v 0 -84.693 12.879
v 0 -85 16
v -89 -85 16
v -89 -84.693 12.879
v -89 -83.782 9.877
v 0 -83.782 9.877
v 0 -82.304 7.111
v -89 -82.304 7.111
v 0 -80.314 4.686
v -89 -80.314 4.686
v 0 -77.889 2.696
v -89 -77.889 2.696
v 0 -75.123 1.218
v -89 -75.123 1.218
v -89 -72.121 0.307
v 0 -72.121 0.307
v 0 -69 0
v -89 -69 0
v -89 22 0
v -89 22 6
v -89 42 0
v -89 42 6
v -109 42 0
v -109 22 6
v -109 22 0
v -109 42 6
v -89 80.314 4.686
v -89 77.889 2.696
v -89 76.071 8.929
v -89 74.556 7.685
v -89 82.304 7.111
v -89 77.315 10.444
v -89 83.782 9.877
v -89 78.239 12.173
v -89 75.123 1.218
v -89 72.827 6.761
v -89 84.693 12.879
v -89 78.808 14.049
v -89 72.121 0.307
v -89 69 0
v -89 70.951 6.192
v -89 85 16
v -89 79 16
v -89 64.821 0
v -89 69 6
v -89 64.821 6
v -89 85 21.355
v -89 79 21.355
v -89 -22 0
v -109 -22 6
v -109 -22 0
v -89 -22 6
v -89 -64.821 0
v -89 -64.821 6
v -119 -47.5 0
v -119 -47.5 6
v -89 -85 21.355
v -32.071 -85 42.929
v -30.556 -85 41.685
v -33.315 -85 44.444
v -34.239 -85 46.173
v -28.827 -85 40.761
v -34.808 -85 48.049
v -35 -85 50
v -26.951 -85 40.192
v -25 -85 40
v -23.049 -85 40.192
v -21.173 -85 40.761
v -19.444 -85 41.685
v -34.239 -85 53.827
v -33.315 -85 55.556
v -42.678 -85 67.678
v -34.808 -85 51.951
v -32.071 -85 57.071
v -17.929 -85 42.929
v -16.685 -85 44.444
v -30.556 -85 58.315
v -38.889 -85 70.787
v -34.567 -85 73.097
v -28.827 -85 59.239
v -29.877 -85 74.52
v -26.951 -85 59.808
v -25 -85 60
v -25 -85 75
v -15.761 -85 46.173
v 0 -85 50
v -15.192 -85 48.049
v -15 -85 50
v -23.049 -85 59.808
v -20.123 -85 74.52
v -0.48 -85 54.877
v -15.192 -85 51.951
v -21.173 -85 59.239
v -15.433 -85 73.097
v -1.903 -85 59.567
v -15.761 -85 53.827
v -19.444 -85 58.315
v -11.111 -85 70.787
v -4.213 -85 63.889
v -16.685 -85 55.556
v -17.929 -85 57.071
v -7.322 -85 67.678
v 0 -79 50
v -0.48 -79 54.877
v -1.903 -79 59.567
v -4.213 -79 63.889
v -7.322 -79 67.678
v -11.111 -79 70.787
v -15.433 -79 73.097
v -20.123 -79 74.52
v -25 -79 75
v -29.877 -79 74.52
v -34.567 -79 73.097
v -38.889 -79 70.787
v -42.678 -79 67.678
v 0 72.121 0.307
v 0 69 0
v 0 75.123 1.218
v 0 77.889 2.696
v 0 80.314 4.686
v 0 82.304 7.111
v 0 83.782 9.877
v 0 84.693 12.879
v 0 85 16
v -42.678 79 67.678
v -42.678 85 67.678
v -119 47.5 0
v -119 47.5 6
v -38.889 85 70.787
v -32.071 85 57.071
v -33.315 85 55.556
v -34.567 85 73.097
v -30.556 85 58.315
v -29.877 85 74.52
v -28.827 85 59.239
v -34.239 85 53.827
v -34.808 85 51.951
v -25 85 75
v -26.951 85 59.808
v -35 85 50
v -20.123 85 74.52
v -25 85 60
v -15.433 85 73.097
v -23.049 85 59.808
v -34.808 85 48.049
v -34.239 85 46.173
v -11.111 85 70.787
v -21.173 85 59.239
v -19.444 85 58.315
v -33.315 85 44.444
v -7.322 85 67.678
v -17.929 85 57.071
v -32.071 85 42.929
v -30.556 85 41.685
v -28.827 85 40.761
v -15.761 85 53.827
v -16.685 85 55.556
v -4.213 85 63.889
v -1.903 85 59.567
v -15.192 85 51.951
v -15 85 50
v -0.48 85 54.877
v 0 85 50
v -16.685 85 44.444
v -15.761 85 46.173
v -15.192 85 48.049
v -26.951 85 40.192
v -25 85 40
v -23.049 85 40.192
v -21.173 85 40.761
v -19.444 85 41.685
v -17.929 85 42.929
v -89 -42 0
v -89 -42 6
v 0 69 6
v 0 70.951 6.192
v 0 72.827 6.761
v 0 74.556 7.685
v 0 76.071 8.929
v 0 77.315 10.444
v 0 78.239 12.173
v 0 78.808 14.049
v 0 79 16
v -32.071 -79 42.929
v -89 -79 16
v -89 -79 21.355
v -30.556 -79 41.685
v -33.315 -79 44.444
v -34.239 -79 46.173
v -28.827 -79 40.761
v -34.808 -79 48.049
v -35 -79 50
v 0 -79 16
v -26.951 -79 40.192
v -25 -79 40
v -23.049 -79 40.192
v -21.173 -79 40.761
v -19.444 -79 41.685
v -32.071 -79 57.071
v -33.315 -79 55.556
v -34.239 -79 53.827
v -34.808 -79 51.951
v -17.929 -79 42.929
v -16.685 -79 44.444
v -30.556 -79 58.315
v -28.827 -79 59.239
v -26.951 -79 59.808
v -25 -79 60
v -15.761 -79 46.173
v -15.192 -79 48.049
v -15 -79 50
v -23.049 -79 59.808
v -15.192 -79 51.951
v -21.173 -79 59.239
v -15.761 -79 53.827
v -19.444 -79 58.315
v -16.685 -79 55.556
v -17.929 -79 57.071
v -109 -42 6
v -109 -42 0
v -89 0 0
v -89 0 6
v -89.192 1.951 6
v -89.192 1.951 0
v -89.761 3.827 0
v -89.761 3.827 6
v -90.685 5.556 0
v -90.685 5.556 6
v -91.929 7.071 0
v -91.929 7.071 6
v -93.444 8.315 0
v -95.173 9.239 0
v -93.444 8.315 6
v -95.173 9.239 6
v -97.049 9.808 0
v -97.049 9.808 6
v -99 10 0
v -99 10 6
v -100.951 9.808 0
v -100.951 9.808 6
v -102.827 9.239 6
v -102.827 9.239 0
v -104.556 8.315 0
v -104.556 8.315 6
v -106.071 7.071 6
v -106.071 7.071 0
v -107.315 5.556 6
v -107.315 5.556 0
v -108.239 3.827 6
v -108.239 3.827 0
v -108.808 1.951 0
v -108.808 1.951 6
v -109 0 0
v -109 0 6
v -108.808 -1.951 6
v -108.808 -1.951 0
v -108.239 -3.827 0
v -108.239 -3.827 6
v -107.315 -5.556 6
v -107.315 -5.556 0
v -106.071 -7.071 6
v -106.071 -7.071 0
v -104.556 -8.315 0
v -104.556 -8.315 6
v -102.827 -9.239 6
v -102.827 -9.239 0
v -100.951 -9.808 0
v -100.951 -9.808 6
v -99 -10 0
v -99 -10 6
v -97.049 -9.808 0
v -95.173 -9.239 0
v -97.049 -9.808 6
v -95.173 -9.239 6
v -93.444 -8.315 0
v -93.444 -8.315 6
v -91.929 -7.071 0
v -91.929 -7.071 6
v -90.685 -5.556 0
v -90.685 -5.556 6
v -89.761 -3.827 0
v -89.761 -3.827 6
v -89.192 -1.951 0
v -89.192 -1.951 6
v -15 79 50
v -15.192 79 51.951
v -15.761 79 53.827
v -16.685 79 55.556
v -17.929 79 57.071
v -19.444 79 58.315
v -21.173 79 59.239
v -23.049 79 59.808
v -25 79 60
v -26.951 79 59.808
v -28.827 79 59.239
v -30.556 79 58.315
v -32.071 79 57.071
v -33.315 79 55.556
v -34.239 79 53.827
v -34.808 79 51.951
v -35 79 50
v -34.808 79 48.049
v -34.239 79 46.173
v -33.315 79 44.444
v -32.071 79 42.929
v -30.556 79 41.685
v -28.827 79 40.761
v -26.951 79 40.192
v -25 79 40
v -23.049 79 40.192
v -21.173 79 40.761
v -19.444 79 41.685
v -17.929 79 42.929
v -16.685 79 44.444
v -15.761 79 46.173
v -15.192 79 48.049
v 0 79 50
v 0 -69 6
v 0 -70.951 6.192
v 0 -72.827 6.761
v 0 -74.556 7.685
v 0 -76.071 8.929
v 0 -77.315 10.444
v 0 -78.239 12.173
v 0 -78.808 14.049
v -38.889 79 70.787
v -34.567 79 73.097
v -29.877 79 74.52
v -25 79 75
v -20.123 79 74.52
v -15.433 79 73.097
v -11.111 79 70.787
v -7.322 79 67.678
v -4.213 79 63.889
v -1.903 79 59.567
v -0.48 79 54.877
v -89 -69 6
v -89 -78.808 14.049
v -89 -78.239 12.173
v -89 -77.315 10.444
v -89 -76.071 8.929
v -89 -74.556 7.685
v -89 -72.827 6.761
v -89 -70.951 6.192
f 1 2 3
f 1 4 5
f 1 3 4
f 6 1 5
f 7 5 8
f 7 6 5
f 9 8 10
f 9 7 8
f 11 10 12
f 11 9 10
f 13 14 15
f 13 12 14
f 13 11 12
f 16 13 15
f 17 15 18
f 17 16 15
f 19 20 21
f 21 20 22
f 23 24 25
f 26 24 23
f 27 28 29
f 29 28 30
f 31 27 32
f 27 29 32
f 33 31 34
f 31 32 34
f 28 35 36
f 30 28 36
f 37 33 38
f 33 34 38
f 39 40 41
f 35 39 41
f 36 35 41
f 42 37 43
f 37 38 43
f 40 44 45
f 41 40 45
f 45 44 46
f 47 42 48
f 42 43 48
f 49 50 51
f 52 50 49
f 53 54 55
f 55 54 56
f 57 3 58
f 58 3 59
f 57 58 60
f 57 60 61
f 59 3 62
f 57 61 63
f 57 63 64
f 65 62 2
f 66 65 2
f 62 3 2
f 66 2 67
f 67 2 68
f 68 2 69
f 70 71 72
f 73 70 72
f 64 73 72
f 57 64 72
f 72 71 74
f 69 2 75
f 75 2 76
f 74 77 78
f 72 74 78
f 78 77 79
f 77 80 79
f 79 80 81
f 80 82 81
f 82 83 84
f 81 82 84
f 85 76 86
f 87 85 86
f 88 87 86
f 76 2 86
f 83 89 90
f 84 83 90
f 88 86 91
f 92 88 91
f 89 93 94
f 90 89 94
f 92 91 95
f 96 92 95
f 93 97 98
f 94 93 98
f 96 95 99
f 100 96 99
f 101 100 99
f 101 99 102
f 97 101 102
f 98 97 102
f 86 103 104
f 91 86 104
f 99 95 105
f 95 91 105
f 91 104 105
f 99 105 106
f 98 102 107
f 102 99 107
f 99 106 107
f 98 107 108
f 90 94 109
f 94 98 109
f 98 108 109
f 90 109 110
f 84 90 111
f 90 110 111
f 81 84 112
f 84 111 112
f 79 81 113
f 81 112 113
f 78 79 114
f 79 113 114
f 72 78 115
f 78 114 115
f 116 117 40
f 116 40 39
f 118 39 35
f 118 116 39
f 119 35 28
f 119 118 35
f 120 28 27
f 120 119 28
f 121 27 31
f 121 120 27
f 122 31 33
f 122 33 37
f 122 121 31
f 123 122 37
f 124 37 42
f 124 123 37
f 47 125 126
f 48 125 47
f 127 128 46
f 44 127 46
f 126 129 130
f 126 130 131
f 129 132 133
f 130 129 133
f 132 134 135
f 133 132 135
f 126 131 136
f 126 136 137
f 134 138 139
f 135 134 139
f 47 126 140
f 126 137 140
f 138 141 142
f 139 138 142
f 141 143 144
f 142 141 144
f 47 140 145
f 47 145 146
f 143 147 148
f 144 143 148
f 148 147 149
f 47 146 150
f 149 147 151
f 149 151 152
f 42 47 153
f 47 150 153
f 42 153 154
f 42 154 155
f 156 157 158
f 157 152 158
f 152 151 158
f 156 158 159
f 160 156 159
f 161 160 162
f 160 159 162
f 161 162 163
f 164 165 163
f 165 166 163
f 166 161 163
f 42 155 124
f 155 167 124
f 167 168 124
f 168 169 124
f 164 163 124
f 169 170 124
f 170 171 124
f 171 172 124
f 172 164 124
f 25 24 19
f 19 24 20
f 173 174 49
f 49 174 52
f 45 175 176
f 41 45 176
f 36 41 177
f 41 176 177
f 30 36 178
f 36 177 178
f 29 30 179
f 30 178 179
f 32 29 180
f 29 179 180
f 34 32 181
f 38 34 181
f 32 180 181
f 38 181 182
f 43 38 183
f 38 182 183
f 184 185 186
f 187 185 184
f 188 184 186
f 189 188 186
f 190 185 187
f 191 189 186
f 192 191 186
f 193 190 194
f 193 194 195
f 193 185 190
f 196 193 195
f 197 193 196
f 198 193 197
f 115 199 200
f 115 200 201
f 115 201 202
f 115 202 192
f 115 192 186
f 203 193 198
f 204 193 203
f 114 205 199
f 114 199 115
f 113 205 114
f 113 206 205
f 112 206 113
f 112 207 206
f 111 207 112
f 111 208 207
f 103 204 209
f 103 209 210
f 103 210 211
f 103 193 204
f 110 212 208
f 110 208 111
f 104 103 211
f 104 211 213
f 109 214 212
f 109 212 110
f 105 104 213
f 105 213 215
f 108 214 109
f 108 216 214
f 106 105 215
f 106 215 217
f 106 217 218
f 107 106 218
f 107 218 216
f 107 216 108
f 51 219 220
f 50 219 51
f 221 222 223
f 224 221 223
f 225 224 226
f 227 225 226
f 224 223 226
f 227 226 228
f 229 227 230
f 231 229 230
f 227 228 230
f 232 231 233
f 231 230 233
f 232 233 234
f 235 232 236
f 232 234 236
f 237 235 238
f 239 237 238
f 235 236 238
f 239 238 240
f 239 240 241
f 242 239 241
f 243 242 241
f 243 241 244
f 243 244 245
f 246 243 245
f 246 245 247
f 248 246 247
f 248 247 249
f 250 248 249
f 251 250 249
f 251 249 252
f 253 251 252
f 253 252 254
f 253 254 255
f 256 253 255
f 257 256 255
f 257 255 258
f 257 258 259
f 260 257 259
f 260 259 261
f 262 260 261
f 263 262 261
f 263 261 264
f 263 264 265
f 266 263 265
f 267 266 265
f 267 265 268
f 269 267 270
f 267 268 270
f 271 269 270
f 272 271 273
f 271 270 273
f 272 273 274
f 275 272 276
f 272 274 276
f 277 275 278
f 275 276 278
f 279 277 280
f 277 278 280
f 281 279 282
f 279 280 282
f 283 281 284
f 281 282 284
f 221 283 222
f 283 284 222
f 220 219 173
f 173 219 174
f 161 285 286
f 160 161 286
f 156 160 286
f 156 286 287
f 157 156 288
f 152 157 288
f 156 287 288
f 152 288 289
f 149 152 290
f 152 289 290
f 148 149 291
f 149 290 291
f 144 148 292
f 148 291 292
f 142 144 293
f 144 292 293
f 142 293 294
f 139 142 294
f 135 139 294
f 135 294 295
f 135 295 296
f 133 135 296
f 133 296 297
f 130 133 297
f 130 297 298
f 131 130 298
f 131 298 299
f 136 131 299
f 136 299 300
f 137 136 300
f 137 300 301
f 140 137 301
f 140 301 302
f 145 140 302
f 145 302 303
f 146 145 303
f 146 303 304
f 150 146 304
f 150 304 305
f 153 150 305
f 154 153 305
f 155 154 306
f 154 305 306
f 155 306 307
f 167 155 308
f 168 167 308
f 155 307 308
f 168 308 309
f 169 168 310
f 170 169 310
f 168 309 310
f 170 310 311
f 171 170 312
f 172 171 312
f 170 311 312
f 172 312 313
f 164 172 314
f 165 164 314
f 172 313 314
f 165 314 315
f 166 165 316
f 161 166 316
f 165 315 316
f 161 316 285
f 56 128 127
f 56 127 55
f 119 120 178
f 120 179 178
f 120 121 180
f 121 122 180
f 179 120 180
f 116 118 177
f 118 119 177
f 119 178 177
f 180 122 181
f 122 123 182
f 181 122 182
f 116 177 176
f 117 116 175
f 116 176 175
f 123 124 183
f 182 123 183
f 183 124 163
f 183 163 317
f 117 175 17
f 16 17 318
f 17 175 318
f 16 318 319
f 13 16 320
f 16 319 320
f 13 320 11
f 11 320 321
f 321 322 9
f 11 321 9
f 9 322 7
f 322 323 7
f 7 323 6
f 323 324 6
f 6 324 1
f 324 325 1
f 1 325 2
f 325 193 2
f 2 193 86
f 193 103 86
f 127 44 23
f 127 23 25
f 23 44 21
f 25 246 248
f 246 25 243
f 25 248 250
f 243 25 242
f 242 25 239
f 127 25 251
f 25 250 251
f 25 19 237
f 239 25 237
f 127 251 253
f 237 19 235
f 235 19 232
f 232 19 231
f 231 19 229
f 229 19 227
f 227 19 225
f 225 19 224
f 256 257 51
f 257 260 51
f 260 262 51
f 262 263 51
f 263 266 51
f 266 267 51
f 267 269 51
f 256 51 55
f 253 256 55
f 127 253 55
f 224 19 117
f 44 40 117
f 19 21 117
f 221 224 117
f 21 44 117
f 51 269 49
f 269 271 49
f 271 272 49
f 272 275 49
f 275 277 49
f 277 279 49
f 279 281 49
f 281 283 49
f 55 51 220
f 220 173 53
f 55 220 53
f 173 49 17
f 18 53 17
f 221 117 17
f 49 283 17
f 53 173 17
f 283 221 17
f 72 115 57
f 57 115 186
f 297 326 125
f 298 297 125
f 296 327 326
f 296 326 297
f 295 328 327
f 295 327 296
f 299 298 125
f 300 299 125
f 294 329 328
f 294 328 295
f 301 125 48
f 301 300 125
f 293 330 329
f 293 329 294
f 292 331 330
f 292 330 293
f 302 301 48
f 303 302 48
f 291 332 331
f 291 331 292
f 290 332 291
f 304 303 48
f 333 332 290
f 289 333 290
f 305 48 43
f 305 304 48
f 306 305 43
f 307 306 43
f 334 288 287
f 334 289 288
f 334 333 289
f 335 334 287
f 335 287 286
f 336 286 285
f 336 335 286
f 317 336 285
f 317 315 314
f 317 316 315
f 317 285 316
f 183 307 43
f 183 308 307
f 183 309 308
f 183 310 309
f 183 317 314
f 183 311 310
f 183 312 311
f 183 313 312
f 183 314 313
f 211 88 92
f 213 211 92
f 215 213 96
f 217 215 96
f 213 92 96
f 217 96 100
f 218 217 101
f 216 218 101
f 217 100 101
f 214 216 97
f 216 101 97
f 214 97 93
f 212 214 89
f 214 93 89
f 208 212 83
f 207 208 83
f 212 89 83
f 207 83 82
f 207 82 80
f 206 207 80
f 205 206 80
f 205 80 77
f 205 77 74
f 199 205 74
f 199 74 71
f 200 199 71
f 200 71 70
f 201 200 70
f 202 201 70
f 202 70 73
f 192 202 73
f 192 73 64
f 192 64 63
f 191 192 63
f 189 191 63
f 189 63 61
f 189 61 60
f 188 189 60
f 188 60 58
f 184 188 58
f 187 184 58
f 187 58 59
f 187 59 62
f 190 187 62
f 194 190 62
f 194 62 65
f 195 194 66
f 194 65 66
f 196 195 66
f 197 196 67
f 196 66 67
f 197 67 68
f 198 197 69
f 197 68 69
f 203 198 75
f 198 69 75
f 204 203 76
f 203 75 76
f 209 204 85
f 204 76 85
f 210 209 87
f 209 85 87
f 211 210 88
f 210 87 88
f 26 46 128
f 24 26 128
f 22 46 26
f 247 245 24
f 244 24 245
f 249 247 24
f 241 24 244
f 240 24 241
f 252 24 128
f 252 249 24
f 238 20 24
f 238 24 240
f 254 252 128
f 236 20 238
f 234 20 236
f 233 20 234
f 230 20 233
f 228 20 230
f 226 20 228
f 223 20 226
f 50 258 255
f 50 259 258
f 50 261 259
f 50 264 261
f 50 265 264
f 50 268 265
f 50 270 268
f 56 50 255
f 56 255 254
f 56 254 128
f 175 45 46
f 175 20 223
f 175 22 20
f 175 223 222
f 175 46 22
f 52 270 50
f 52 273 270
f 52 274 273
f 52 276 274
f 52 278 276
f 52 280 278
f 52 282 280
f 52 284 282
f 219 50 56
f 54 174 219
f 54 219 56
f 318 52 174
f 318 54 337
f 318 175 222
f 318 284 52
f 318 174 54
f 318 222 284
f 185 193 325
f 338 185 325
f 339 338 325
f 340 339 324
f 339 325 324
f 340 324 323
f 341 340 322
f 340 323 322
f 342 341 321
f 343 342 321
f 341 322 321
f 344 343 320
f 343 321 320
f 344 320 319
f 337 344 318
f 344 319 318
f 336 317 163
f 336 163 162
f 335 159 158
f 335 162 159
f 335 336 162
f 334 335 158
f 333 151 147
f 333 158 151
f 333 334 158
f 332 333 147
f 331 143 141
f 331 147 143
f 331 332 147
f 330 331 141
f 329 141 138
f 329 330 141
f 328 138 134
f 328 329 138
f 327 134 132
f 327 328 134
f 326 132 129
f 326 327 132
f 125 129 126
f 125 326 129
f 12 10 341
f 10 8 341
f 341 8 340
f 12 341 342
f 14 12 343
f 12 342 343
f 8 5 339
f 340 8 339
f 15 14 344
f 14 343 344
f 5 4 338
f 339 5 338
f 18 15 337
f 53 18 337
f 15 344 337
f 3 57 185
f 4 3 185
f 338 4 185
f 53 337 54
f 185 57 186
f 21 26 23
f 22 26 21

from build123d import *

# Parameters (mm, degrees)
PAD_DEPTH            = 119
THICKNESS_T          = -6
SKETCH001_W          = 300
SKETCH001_H          = 200
POCKET_DEPTH         = 85.001
POCKET_DEPTH_BACK    = -85.001
SKETCH002_R          = 10
SKETCH002_W          = 20
SKETCH002_H          = 20
POCKET001_DEPTH      = 6.001
POCKET001_DEPTH_BACK = -69.001
SKETCH003_R          = 10
POCKET002_DEPTH      = 170.001


with BuildPart() as part:
    # Sketch (on YZ_Plane of Origin) → Pad (new body)
    with BuildSketch(Plane.YZ):
        with BuildLine():
            Line((-85, 75), (85, 75))
            Line((85, 75), (85, 16))
            ThreePointArc((69, 0), (80.313708, 4.686292), (85, 16))
            Line((69, 0), (-69, 0))
            ThreePointArc((-85, 16), (-80.313708, 4.686292), (-69, 0))
            Line((-85, 16), (-85, 75))
        make_face()
    extrude(amount=-PAD_DEPTH)

    # Thickness
    thickness_openings = [part.faces().sort_by_distance(p)[0] for p in [
        (-119, 0, 37.794908),
        (-59.5, 0, 75),
        (0, 0, 37.794908),
    ]]
    offset(amount=THICKNESS_T, openings=thickness_openings)

    # Sketch001 (on XZ_Plane of Origin) → Pocket (cut, two sides)
    with BuildSketch(Plane.XZ) as pocket_sk:
        Rectangle(SKETCH001_W, SKETCH001_H)
        with BuildLine():
            Line((0, 0), (0, 50))
            ThreePointArc((0, 50), (-15.432914, 73.096988), (-42.67767, 67.67767))
            Line((-42.67767, 67.67767), (-89, 21.355339))
            Line((-89, 6), (-89, 21.355339))
            Line((-89, 6), (-119, 6))
            Line((-119, 6), (-119, 0))
            Line((-119, 0), (0, 0))
        make_face(mode=Mode.SUBTRACT)
    extrude(amount=-POCKET_DEPTH, mode=Mode.SUBTRACT)
    extrude(pocket_sk.sketch, amount=-POCKET_DEPTH_BACK, mode=Mode.SUBTRACT)

    # Sketch002 (on Face16 of Pocket) → Pocket001 (cut, two sides)
    with BuildSketch(Plane.XY.offset(6)) as pocket001_sk:
        with Locations((-99, 0)):
            Circle(SKETCH002_R)
        Polygon((-89, 64.820508), (-89, 100), (-169, 100), (-169, -100), (-89, -100), (-89, -64.820508), (-119, -47.5), (-119, 47.5), align=None)
        with Locations((-99, 32)):
            Rectangle(SKETCH002_W, SKETCH002_H)
        with Locations((-99, -32)):
            Rectangle(SKETCH002_W, SKETCH002_H)
    extrude(amount=-POCKET001_DEPTH, mode=Mode.SUBTRACT)
    extrude(pocket001_sk.sketch, amount=-POCKET001_DEPTH_BACK, mode=Mode.SUBTRACT)

    # Sketch003 (on Face14 of Pocket001) → Pocket002 (cut, through all)
    with BuildSketch(Plane.XZ.offset(85)):
        with Locations((-25, 50)):
            Circle(SKETCH003_R)
    extrude(amount=-POCKET002_DEPTH, mode=Mode.SUBTRACT)


solid = part.part
